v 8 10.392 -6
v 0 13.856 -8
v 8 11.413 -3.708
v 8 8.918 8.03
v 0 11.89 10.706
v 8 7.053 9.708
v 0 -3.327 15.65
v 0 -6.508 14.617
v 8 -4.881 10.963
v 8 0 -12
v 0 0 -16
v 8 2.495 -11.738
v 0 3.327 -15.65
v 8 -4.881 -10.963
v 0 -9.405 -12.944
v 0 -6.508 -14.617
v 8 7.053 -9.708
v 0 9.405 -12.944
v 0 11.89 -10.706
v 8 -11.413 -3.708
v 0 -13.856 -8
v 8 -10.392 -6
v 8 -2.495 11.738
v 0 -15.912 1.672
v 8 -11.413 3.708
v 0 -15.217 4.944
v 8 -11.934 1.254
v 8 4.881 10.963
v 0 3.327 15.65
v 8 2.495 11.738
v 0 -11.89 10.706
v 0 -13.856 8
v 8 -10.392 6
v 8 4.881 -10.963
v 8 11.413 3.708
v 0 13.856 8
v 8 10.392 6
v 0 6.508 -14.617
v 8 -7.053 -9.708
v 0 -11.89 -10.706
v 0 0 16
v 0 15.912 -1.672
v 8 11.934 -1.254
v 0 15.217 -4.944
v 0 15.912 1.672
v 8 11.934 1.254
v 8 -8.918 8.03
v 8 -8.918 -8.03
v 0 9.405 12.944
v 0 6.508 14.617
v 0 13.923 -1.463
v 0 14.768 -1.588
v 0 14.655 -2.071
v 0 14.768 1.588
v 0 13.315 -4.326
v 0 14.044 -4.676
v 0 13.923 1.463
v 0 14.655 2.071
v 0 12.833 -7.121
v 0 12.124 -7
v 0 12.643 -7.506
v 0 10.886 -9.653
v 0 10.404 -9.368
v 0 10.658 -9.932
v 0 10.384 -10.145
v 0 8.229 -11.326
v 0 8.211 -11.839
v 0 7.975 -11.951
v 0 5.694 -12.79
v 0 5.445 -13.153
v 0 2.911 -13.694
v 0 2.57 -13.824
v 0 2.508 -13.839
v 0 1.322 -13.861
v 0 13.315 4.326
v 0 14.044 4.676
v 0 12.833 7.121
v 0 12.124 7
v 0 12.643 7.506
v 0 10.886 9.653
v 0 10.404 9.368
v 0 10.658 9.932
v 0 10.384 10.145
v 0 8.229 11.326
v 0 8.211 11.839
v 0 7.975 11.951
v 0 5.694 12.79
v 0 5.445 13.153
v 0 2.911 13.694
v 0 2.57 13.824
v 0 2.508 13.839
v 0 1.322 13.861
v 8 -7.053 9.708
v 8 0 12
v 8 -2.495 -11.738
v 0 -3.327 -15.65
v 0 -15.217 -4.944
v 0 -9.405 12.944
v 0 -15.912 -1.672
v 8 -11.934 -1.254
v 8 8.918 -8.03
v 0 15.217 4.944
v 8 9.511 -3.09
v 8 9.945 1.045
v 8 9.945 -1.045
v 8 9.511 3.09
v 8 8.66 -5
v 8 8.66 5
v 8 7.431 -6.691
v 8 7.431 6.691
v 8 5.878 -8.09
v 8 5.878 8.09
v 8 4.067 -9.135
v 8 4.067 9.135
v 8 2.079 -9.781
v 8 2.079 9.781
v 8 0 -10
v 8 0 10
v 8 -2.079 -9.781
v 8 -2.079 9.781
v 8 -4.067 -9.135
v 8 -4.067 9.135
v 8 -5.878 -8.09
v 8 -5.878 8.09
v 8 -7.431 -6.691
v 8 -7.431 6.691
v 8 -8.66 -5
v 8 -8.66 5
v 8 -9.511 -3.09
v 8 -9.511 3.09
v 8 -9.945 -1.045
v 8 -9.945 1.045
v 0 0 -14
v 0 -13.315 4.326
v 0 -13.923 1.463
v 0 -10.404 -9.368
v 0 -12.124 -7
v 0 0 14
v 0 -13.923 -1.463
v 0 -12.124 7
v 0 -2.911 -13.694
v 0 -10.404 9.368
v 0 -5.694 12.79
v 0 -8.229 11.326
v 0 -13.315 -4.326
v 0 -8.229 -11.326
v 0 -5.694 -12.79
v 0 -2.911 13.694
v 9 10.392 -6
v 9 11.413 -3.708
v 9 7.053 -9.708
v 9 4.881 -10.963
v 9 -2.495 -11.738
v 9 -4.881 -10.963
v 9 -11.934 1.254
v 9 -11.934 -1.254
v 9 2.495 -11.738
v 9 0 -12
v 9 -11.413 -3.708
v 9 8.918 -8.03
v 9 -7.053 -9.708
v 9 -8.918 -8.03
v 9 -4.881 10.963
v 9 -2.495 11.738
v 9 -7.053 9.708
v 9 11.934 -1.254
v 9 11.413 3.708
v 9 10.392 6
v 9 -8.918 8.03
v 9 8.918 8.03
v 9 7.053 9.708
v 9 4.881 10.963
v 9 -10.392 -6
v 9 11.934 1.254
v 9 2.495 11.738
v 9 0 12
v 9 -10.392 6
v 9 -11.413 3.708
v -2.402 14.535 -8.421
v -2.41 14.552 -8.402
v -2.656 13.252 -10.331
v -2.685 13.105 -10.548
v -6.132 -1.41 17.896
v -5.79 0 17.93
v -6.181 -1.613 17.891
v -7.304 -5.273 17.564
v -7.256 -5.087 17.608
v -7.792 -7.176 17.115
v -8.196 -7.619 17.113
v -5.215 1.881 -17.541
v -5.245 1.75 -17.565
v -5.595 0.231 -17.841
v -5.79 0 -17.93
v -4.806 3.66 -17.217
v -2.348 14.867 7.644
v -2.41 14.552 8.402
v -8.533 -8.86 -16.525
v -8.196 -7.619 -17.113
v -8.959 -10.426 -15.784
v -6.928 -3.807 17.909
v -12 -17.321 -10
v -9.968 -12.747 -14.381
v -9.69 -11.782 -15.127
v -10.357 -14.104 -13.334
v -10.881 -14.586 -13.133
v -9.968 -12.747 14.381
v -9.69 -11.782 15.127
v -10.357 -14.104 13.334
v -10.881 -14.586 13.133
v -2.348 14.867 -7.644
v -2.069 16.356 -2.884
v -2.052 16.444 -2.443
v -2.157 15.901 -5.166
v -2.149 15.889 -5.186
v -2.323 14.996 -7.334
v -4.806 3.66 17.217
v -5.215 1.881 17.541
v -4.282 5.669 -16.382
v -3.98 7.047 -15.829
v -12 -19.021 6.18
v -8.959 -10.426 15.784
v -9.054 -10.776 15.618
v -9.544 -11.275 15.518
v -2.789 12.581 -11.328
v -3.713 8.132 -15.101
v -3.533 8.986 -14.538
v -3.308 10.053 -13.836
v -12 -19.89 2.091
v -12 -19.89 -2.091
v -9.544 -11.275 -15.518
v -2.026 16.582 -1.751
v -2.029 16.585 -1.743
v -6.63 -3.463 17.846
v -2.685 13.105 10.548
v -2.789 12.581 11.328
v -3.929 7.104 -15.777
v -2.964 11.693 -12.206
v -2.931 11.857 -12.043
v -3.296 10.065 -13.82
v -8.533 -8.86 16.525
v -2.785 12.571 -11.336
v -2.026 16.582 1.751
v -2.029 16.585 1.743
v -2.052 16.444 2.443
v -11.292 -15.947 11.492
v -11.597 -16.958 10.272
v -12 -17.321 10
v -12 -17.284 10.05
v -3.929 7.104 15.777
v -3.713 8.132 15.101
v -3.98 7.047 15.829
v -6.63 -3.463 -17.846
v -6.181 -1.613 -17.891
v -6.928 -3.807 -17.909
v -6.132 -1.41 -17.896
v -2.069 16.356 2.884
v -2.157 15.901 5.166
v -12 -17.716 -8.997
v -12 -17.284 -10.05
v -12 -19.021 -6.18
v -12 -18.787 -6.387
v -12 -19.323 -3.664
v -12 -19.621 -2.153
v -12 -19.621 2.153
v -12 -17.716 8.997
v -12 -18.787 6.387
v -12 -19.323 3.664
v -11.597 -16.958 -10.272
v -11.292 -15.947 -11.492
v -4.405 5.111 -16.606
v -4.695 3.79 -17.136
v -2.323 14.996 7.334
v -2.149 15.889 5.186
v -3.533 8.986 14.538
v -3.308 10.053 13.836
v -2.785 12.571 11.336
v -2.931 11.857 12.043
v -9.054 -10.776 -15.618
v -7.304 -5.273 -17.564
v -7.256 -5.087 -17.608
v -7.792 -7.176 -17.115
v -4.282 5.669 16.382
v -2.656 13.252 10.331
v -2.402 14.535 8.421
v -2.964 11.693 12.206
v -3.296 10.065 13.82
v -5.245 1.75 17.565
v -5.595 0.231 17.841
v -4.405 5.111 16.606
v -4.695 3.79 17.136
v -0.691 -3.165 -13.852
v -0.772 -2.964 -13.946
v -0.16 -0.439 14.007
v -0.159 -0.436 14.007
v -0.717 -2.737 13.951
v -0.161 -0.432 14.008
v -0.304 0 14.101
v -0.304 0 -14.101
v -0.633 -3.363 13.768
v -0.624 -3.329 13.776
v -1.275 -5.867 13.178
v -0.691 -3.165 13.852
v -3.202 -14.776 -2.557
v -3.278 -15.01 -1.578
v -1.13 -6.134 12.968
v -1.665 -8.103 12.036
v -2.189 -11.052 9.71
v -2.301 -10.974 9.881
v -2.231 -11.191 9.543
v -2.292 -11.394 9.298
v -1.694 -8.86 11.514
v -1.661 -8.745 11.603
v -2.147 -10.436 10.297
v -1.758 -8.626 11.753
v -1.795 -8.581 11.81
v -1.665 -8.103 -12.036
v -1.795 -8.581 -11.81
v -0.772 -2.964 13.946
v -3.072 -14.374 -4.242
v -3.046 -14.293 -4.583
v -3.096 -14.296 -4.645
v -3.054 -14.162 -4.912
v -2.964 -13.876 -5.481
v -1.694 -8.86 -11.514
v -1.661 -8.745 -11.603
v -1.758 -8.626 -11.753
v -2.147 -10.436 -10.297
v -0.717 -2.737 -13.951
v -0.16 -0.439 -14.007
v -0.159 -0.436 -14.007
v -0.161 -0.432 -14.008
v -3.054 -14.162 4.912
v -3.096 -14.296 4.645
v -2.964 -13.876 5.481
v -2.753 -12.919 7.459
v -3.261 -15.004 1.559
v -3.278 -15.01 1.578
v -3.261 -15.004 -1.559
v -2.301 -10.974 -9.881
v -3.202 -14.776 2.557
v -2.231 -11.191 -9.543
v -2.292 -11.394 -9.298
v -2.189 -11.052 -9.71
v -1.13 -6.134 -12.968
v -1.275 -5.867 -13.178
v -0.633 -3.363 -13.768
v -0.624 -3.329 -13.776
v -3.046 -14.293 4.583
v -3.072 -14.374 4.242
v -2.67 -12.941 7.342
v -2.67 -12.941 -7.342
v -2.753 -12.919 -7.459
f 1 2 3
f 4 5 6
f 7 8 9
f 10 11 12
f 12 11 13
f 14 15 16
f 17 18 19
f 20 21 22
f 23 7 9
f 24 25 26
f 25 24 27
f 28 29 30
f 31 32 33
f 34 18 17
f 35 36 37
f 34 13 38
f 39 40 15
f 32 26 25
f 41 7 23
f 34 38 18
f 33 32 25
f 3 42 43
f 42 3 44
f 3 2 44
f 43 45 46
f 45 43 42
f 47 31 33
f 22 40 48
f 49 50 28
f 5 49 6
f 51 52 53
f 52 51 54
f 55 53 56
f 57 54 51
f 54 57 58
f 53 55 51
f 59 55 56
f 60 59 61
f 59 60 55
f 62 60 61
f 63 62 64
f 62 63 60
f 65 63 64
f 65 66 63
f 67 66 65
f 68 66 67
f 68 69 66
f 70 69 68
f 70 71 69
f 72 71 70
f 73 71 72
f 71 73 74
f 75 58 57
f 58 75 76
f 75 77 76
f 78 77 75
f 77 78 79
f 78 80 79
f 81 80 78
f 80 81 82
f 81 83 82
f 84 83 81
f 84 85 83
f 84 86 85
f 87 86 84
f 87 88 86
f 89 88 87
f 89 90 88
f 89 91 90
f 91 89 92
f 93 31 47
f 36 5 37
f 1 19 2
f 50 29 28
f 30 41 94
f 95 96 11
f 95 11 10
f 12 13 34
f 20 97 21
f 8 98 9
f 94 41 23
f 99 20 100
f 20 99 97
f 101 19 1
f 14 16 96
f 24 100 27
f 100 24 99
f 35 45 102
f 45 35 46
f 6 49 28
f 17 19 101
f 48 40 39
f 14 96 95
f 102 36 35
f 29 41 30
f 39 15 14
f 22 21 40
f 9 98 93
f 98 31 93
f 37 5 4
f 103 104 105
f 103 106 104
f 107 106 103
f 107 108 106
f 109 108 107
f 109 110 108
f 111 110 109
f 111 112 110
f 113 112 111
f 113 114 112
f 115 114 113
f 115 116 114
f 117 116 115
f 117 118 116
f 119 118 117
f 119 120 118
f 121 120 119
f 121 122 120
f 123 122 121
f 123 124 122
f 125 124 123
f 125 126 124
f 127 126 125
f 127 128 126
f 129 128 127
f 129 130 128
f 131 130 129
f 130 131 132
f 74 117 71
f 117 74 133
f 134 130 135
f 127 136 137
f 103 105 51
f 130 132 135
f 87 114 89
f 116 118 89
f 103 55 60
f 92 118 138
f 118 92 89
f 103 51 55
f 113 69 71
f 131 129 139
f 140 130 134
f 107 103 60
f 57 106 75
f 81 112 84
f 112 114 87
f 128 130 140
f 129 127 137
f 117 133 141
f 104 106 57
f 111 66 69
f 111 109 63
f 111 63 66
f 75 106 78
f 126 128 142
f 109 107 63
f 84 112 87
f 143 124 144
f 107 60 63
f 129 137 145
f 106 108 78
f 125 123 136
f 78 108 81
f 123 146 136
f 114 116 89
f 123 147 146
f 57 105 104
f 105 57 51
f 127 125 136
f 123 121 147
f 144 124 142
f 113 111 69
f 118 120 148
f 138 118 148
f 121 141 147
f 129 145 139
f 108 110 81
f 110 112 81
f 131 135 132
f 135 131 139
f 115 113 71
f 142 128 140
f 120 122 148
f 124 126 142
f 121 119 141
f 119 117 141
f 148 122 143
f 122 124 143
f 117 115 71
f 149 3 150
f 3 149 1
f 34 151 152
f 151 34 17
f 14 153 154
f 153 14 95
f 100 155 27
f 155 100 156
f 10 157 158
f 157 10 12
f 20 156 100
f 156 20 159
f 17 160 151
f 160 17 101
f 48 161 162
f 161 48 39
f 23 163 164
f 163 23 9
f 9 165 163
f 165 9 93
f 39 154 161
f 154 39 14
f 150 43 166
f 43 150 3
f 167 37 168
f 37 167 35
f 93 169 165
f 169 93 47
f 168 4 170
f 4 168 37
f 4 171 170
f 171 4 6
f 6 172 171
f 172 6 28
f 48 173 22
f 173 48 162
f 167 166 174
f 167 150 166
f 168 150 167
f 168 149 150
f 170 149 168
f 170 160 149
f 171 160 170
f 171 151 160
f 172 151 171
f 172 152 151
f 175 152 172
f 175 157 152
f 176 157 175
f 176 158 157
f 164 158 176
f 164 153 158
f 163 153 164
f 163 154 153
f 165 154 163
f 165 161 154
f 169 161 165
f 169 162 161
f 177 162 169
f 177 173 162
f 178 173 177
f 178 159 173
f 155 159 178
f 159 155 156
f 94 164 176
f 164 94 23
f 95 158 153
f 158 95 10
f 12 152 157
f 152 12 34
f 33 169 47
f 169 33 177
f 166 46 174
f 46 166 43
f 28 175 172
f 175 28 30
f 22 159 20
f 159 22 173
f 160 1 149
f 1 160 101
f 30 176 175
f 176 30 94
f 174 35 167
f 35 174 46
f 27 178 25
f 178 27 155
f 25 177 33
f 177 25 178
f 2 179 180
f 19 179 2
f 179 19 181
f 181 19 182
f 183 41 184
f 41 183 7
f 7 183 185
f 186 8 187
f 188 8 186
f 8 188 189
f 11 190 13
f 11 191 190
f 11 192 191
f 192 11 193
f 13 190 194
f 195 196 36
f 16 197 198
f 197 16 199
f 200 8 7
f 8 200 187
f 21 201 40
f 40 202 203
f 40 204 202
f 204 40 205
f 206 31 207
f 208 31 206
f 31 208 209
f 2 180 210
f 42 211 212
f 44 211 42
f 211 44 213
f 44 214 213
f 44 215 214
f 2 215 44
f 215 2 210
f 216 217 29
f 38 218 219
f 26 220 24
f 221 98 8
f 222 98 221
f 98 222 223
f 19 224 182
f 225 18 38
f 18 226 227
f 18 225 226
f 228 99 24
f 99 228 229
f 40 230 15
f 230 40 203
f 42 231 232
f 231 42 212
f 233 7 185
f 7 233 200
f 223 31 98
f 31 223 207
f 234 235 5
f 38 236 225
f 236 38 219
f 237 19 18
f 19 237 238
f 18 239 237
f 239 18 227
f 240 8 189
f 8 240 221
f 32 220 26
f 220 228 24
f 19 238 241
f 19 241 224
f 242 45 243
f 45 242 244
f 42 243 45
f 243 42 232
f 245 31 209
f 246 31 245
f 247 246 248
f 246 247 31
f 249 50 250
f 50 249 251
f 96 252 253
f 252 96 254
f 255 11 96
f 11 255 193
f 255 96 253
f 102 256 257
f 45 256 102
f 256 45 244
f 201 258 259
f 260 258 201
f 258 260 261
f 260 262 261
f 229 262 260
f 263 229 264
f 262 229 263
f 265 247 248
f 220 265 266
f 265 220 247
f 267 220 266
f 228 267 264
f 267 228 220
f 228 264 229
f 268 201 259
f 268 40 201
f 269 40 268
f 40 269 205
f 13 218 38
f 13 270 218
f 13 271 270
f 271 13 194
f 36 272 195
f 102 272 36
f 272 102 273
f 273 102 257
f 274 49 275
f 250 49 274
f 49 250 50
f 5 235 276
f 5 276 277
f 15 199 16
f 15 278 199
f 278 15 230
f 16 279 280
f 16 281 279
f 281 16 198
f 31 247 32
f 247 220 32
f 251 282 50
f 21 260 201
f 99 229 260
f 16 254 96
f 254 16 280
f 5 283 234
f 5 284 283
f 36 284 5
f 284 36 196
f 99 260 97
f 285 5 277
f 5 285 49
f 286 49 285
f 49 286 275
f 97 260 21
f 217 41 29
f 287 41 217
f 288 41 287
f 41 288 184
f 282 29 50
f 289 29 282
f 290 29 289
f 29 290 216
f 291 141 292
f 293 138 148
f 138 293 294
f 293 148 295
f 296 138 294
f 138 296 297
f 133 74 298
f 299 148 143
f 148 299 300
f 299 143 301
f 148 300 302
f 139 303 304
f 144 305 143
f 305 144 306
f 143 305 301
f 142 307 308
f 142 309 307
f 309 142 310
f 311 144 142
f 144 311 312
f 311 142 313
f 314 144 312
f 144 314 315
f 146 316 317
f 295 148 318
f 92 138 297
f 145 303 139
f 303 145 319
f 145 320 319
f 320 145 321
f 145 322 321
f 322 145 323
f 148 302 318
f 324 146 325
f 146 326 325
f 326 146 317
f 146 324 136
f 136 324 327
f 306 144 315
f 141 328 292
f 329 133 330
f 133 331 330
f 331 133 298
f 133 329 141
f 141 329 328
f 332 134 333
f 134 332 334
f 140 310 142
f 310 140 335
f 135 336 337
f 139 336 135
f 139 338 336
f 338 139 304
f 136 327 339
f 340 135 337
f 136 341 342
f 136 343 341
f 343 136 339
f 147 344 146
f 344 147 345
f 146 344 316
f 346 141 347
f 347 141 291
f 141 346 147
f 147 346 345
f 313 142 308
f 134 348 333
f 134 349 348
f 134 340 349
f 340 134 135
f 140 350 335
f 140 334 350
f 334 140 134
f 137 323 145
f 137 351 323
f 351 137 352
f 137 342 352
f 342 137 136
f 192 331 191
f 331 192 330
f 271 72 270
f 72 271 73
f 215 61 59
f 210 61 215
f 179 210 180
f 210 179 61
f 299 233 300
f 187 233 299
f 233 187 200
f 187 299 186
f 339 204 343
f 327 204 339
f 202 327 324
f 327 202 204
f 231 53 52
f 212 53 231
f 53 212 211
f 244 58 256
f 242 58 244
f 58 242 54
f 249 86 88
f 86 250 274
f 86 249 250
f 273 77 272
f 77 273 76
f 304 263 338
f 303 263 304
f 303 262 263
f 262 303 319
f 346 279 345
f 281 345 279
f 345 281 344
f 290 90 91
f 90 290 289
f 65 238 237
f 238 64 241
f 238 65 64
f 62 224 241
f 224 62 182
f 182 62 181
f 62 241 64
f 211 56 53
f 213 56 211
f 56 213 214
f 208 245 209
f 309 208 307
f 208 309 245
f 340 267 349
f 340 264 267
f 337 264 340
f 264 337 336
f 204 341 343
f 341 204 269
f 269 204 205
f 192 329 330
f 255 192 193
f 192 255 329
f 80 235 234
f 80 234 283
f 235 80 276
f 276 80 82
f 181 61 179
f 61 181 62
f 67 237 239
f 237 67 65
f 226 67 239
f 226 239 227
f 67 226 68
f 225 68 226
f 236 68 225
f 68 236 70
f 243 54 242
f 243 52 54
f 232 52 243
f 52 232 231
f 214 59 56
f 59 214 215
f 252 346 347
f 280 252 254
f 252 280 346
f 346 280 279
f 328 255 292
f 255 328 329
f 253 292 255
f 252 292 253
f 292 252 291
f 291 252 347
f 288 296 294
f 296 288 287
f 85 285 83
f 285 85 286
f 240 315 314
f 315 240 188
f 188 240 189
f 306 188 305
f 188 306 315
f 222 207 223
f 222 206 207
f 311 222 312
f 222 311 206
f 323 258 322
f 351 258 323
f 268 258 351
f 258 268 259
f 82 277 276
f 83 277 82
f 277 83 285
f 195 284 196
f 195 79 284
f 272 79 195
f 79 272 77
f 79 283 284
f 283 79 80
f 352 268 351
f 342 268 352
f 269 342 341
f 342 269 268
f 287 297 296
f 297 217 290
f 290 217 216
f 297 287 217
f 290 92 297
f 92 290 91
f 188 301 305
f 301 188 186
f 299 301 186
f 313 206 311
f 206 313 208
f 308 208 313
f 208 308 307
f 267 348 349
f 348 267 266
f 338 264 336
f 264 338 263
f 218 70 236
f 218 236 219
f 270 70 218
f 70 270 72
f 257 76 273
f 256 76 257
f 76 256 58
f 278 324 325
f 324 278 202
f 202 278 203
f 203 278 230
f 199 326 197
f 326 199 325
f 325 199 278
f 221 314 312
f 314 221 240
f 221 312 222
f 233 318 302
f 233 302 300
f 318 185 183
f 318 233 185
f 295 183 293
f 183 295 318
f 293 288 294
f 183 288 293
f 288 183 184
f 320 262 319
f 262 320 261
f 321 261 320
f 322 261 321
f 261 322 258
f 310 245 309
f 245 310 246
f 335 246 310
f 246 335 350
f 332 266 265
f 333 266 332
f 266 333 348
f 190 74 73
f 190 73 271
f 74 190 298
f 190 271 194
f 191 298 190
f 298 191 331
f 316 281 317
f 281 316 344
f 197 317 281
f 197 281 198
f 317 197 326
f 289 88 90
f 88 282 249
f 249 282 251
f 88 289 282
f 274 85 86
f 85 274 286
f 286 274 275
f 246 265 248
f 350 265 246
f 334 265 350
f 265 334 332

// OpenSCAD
//goggles
//union(){}
//intersection(){

//cylinder(height, r1, r2, center=true/false)


union(){

union(){
translate([8,0,0]) rotate([90,90,90]) cylinder(1,12,12);
difference(){
translate([0,0,0]) rotate([90,90,90]) cylinder(8,16,12);
translate([0,0,0]) rotate([90,90,90]) cylinder(8,14,10);
}
}

//translate([-16,0,0])
difference(){
difference(){
translate([-12,0,0]) rotate([90,90,90]) cylinder(12,20,16);
translate([-12,0,0]) rotate([90,90,90]) cylinder(12,18,14);
}


translate([-20,2,0]) rotate([97,90,90]) cylinder(20,28,14);
}

}
